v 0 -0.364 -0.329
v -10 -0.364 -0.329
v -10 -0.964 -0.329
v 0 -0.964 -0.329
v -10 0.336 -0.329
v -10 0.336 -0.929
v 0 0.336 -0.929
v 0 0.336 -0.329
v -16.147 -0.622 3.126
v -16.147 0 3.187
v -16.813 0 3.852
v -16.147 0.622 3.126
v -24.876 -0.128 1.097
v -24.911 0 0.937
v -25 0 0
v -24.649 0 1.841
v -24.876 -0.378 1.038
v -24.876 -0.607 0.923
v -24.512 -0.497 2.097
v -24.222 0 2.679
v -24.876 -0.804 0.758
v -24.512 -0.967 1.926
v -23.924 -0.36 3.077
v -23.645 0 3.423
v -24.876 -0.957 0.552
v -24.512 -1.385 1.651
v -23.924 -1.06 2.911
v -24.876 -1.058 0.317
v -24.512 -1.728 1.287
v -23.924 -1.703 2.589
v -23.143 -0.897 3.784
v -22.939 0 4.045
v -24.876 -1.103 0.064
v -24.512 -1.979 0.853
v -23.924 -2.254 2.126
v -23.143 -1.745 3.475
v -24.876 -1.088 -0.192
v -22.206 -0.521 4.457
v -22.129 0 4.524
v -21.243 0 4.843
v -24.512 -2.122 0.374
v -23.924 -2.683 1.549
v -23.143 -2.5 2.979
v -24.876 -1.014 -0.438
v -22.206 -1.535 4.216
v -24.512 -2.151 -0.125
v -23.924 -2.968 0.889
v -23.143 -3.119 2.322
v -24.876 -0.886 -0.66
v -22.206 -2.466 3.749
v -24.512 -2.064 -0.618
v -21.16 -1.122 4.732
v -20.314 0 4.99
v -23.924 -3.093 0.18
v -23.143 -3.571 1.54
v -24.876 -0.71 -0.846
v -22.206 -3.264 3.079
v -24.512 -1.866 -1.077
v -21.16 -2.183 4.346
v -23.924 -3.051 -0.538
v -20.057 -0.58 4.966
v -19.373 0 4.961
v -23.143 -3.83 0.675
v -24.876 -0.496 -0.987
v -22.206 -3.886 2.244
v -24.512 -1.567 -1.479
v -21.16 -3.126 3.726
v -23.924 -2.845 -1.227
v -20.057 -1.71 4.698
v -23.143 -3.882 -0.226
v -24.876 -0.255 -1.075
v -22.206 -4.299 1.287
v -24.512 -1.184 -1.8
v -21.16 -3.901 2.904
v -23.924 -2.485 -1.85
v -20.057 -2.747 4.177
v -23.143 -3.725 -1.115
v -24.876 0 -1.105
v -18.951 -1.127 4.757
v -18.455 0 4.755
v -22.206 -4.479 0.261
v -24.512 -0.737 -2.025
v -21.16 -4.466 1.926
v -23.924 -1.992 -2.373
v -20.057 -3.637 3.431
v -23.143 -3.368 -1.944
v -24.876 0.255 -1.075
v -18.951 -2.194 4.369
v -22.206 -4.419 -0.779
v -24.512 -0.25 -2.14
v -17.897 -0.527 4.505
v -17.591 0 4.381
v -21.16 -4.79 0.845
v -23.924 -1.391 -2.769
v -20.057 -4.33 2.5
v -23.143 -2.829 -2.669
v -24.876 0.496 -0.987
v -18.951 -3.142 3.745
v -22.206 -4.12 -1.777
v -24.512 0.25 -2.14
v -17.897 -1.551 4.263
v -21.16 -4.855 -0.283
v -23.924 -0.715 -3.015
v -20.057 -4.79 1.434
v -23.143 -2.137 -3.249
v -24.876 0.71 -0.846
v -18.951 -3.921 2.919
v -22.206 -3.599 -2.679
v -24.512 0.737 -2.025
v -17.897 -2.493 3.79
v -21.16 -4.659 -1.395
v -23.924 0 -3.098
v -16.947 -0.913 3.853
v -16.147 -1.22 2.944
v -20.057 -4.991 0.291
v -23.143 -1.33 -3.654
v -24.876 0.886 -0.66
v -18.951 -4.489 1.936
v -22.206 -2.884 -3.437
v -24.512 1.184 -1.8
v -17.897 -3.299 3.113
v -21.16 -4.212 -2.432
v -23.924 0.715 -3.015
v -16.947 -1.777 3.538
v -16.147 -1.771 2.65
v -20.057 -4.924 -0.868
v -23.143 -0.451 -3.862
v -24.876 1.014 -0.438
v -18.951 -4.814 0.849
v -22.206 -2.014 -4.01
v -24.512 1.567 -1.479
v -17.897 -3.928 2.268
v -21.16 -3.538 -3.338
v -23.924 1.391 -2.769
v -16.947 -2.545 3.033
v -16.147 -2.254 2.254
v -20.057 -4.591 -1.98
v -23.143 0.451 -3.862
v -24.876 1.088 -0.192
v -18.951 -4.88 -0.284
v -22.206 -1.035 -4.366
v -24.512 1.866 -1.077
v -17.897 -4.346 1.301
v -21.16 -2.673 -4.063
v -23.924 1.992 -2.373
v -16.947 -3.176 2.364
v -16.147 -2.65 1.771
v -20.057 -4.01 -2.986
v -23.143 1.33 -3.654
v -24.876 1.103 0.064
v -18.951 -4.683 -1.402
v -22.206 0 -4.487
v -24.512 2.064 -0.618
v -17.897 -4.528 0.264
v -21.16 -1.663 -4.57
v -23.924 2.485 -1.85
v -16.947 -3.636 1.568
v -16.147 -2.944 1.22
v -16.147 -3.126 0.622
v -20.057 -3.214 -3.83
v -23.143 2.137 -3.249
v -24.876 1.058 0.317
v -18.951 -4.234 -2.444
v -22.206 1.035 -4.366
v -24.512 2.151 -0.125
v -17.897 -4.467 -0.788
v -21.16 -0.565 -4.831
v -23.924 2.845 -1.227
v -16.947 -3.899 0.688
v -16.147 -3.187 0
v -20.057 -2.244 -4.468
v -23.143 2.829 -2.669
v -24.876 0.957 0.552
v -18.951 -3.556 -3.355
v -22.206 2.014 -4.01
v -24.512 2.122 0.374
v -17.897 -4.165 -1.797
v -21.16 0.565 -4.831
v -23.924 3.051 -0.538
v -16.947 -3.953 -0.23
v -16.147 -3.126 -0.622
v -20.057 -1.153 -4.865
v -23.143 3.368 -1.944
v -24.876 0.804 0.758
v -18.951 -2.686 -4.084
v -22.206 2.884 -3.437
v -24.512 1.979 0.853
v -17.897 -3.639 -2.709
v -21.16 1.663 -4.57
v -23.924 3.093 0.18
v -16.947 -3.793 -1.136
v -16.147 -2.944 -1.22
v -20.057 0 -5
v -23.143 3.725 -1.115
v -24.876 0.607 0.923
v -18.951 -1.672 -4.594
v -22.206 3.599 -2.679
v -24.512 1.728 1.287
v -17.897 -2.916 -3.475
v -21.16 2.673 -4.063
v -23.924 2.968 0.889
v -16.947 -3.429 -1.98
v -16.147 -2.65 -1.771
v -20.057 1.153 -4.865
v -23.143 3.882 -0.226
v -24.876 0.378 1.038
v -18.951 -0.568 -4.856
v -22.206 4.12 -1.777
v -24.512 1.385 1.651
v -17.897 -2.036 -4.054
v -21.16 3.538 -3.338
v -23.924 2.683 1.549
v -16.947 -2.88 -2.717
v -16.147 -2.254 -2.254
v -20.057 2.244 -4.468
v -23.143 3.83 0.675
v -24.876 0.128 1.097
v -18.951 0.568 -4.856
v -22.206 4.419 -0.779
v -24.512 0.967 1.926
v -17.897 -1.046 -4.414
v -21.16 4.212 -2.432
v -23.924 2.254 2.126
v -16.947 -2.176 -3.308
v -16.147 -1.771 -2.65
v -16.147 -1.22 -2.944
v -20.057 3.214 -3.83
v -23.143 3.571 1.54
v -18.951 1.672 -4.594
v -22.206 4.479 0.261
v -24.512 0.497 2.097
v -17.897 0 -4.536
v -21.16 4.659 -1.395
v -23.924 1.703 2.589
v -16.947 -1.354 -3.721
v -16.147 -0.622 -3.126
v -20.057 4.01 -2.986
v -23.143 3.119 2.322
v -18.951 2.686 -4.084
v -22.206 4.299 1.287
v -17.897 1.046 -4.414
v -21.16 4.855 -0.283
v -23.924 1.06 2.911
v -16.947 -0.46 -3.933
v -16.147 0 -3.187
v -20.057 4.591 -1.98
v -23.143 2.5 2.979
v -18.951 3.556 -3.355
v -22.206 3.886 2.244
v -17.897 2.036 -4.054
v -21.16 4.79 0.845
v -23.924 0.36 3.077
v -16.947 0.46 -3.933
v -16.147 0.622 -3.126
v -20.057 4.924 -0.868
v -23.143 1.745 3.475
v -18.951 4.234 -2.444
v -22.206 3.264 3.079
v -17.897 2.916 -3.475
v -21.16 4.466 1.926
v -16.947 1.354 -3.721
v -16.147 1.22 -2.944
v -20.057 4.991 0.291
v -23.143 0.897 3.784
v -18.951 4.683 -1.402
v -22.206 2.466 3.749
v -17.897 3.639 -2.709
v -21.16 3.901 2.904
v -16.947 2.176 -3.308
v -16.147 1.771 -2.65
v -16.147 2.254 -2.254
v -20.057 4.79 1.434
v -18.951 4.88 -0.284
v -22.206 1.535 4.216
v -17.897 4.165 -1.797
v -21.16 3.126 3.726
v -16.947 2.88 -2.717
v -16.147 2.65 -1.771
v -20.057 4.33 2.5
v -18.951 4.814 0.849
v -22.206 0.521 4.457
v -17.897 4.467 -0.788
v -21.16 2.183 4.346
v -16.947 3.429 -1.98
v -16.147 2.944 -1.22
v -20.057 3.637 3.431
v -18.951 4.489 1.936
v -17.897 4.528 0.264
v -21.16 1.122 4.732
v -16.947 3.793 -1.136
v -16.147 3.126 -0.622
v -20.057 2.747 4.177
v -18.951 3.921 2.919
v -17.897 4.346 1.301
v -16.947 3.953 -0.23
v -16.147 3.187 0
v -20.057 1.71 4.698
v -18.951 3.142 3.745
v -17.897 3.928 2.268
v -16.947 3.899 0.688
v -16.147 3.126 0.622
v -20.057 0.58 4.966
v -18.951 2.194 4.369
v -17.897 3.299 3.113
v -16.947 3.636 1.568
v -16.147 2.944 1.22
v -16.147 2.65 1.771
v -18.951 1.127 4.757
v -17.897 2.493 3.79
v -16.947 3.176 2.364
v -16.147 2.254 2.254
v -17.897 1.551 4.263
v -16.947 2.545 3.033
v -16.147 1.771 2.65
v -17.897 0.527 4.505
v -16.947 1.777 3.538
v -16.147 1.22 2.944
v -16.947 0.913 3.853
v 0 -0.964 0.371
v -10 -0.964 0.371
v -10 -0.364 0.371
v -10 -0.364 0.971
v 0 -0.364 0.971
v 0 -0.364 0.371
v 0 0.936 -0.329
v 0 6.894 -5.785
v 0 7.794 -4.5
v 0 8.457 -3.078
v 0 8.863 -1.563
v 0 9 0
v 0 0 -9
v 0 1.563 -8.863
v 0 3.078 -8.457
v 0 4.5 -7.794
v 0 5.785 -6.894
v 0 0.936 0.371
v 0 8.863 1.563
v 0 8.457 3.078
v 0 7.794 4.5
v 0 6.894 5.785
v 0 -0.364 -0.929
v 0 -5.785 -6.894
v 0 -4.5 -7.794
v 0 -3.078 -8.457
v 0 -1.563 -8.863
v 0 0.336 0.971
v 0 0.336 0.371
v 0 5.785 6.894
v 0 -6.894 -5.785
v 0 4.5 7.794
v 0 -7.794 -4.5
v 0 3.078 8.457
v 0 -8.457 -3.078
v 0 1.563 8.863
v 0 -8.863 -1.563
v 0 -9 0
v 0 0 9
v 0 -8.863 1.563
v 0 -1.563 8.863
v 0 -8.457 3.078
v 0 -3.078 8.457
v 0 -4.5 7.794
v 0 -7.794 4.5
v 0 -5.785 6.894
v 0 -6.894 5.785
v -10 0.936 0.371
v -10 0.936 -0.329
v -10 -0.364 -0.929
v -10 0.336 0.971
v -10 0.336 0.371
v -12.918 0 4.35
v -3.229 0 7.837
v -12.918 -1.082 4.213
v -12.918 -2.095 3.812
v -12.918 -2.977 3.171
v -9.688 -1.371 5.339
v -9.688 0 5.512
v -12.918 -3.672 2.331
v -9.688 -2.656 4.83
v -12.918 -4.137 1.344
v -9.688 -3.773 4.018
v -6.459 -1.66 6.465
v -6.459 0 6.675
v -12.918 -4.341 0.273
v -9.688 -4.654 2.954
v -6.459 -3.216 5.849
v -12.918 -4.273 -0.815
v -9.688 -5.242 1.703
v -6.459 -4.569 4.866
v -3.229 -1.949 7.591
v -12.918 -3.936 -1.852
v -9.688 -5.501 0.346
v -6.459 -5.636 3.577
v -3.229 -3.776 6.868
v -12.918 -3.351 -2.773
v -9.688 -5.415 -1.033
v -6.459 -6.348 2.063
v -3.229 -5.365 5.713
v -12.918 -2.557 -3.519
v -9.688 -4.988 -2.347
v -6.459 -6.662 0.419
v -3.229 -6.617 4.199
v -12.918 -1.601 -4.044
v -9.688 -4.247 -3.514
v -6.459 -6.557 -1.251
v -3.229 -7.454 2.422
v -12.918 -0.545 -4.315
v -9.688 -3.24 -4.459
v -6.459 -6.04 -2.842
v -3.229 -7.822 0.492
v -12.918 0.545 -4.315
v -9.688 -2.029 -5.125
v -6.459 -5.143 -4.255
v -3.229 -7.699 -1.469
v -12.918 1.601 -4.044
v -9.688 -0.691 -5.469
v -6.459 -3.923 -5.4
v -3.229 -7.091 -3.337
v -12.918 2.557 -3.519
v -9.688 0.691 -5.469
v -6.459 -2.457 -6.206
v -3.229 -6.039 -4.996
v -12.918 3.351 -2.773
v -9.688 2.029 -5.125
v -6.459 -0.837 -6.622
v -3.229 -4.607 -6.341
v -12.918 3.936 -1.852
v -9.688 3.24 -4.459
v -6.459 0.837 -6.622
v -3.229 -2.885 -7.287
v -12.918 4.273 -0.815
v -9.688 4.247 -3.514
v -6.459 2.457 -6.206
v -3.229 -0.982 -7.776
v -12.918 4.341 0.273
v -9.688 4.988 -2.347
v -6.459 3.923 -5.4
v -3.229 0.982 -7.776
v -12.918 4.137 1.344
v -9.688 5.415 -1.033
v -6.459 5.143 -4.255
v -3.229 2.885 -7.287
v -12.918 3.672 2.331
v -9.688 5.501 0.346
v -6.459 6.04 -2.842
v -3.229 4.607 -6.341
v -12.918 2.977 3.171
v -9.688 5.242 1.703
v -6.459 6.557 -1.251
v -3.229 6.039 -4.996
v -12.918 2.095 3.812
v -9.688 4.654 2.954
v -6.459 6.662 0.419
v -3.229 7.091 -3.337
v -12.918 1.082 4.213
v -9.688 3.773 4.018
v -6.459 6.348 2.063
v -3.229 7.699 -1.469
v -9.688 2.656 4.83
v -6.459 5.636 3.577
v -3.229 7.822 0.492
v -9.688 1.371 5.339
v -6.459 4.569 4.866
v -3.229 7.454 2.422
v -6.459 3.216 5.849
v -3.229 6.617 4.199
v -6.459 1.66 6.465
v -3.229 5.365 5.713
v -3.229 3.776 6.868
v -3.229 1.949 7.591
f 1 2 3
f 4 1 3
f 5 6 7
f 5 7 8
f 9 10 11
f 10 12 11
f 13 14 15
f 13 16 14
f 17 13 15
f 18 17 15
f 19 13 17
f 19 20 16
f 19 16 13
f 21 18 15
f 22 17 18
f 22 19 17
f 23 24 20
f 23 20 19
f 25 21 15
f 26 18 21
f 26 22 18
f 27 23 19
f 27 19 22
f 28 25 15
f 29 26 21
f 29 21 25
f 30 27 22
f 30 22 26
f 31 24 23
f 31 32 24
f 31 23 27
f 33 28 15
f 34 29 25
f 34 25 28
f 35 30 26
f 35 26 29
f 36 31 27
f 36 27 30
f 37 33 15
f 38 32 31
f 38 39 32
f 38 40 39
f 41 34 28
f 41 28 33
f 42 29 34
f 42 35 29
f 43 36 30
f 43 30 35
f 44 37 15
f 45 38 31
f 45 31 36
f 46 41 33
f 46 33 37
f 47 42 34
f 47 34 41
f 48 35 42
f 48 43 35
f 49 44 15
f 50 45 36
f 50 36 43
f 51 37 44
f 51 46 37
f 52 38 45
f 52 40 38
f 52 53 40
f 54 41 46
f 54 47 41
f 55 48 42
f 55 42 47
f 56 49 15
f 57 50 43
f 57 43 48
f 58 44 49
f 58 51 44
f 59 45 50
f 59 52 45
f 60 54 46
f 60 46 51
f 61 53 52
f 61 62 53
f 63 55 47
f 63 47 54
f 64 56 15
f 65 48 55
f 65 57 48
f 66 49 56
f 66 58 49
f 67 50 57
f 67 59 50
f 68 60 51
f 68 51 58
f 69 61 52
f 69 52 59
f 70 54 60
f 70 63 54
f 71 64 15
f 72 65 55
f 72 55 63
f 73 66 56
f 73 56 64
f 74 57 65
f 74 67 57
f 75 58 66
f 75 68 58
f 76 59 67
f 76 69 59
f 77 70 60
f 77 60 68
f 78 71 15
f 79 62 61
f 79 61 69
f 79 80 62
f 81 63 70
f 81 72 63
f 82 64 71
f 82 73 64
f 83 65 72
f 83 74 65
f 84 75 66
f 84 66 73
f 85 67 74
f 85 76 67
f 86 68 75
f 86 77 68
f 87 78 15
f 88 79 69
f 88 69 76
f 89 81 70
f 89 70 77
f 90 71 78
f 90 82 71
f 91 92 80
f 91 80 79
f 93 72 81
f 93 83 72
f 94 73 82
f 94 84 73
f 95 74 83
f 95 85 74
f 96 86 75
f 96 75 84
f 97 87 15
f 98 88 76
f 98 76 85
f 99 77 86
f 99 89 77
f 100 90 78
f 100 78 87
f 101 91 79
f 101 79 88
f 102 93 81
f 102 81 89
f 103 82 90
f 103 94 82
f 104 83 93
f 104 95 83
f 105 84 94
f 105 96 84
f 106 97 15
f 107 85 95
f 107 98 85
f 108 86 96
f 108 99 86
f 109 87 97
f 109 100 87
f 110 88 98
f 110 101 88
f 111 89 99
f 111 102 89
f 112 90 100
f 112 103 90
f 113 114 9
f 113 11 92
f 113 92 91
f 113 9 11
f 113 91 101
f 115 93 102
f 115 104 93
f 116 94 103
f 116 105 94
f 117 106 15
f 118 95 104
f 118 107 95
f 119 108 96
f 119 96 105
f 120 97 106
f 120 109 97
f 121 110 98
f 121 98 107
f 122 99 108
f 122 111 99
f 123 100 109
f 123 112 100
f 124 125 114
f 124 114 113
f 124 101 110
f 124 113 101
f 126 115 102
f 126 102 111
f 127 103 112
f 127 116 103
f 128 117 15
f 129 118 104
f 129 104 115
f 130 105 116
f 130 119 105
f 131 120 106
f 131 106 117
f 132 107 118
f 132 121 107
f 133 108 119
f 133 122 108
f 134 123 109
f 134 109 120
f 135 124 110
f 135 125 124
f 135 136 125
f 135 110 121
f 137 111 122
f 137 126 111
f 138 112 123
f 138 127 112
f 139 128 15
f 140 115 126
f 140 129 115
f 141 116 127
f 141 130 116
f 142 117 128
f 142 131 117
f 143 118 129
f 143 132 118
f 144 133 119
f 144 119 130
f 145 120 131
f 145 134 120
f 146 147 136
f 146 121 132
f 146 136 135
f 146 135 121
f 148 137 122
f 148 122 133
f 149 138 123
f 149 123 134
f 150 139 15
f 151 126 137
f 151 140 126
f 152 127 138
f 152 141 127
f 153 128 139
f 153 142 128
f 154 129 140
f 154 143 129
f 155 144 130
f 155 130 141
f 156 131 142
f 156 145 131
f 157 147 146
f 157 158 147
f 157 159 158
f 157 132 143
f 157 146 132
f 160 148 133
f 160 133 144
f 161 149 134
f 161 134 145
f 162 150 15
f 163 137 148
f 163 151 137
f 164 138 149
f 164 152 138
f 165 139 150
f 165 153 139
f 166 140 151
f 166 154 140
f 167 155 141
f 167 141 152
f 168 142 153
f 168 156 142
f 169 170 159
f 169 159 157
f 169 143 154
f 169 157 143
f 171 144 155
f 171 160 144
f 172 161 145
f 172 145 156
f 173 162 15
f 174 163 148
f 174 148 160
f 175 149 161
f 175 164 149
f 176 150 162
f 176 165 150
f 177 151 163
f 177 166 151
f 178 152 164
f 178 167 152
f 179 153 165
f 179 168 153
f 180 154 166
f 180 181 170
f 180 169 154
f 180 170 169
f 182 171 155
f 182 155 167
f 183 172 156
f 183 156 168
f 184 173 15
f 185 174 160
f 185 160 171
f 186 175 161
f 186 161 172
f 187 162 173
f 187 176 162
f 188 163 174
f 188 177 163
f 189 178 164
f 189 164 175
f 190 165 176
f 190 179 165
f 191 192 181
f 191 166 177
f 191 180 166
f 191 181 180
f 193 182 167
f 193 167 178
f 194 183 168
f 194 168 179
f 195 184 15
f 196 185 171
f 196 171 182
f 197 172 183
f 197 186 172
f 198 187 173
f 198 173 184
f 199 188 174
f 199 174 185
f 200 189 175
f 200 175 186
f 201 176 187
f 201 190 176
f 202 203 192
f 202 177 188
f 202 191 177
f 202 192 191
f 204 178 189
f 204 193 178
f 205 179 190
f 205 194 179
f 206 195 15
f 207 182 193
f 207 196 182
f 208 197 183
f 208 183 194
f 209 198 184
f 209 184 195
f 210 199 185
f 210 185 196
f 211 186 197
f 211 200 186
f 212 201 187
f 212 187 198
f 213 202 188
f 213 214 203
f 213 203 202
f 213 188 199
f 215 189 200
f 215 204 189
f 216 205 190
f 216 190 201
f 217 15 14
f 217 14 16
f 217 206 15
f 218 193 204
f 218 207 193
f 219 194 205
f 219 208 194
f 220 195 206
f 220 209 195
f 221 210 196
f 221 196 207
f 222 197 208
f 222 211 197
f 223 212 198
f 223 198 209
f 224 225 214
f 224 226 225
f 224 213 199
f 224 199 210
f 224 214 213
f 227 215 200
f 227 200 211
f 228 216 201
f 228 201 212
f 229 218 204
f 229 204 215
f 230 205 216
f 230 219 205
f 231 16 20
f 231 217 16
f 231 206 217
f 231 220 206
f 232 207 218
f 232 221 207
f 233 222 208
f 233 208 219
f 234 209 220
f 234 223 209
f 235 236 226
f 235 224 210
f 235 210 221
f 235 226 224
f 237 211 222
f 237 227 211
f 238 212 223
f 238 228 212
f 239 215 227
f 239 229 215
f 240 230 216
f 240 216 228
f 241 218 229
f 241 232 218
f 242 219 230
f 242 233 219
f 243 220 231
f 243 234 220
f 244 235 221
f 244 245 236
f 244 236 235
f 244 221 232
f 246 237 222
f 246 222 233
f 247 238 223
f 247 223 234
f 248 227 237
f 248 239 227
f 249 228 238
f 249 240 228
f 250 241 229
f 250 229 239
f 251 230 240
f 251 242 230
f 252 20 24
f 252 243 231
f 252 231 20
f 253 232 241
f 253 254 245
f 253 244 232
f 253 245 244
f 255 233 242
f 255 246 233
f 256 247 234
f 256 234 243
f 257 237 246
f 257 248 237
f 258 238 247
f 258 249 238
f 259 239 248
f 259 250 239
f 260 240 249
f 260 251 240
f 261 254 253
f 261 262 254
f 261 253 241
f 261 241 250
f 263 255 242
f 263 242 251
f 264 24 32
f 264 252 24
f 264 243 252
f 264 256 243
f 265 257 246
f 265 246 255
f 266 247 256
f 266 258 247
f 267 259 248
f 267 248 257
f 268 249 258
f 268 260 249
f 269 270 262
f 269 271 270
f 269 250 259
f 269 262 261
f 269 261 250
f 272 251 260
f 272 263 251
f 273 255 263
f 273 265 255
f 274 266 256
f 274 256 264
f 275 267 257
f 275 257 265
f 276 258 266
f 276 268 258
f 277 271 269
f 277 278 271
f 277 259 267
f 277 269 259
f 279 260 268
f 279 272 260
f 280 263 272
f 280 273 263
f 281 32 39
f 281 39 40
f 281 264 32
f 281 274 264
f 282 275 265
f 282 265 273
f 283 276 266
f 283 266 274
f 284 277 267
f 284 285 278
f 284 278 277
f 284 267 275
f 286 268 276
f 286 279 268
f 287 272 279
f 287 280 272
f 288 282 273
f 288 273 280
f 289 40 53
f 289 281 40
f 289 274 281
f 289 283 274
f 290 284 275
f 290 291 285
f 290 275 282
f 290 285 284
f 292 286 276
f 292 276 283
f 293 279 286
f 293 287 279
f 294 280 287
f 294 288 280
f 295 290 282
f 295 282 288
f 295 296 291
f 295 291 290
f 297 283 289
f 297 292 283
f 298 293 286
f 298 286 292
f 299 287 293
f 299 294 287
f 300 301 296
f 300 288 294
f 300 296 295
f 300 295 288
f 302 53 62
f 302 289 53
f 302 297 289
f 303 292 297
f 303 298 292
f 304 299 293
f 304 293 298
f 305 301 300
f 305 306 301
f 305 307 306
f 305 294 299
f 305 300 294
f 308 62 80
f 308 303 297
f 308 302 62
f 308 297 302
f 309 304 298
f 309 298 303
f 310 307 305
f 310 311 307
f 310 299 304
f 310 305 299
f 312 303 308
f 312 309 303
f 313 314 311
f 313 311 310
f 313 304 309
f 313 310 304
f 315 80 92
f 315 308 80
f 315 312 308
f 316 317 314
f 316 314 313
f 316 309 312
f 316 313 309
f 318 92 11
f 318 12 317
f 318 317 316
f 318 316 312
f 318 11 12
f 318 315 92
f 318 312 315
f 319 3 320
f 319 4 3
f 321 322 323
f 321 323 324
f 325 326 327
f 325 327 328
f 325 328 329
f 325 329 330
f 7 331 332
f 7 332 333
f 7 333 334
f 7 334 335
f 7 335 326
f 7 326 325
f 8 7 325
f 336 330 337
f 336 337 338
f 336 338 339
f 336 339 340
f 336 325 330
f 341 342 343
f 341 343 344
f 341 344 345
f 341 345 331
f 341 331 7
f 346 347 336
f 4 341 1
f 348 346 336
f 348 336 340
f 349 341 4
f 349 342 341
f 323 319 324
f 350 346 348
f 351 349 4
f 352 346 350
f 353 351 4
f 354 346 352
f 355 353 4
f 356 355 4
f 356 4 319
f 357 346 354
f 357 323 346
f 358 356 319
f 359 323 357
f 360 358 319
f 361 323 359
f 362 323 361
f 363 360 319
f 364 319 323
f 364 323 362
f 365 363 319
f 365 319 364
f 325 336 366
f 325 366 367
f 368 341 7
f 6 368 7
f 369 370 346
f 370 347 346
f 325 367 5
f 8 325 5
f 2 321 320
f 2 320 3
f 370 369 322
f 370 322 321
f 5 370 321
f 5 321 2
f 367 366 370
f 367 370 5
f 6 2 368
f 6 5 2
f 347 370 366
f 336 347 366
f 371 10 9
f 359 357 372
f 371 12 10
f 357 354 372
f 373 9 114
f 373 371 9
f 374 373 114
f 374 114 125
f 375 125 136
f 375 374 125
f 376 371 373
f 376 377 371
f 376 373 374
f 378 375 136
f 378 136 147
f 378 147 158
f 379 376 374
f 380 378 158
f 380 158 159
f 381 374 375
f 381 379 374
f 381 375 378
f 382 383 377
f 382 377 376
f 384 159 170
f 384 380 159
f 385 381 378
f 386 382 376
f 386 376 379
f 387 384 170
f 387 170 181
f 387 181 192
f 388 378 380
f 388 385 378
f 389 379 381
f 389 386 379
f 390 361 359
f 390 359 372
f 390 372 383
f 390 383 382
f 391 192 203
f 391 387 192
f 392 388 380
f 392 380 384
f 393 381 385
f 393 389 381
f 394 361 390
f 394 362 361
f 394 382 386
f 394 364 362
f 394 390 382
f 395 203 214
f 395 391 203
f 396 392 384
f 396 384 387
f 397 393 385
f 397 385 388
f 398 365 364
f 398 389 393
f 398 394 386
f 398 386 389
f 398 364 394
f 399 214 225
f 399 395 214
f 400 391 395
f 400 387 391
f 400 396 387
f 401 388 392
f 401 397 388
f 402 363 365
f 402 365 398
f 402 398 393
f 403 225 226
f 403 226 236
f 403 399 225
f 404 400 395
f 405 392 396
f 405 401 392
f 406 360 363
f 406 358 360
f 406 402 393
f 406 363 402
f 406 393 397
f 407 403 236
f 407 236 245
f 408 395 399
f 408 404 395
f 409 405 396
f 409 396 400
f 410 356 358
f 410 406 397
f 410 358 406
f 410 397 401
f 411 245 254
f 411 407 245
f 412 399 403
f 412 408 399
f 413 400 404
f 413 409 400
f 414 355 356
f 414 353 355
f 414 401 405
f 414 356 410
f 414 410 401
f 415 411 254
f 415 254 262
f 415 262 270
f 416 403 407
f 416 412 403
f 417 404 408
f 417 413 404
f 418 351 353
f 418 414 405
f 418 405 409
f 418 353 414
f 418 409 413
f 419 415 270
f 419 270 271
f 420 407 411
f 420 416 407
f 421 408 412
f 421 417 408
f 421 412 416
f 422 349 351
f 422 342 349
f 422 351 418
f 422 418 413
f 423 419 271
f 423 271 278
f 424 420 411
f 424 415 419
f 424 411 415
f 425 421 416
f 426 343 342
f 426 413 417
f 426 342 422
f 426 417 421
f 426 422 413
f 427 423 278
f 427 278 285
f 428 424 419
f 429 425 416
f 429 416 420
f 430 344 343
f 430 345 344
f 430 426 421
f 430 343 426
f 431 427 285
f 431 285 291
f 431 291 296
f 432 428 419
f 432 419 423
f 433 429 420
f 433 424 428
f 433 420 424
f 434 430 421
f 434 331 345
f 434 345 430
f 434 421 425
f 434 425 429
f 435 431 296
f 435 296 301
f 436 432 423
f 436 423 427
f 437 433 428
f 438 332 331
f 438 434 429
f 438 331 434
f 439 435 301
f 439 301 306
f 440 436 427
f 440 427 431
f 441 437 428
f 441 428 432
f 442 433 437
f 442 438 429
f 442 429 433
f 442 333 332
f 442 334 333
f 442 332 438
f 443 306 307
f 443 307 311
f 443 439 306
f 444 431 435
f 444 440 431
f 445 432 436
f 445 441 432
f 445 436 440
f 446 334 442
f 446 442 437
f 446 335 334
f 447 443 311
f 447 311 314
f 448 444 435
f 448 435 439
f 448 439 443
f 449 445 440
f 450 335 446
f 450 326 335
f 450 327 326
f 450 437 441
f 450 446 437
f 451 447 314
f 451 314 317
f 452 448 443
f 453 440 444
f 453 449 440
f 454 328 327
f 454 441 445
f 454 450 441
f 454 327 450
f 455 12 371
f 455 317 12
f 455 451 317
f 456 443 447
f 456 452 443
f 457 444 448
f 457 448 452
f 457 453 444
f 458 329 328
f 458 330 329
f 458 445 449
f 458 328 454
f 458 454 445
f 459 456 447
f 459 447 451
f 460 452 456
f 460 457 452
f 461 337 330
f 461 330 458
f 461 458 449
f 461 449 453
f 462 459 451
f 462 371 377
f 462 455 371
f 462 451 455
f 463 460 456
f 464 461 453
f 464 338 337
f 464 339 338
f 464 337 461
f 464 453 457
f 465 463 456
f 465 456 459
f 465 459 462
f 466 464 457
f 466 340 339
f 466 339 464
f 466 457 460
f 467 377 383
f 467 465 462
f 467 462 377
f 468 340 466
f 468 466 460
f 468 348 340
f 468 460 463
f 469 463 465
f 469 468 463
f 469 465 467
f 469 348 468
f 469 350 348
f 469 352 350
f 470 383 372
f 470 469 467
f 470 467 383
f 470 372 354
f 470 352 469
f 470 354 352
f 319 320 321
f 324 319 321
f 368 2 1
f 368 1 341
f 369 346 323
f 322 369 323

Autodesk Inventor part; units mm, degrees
ref_plane "YZ Plane" through (0, 0, 0) normal (1, 0, 0) x (0, 1, 0)
ref_plane "XZ Plane" through (0, 0, 0) normal (0, 1, 0) x (-1, 0, 0)
ref_plane "XY Plane" through (0, 0, 0) normal (0, 0, 1) x (1, 0, 0)
sketch "Esquisse1" plane through (0, 0, 0) normal (0, 1, 0) x (-1, 0, 0)
  line L0 (0, 0) -> (25, 0)
  line L1 (25, 0) -> (0, 0)
  line L2 (0, 0) -> (0, 9)
  line L3 (0, 9) -> (25, 0)
  arc A0 (25, 0) -> (15, 0) centre (20, 0) ccw
  dimension "d0" = 9
  dimension "d1" = 25
  dimension "d2" = 5
revolve "Révolution1" add sketch "Esquisse1" angle 360 about axis through (-25, 0, 0) along (1, 0, 0)
sketch "Esquisse2" plane through (0, 0, 0) normal (1, 0, 0) x (0, 0, -1)
  line L0 (-0.3714, 0.9357) -> (0.3286, 0.9357)
  line L1 (0.3286, 0.9357) -> (0.3286, -0.9643)
  line L2 (0.3286, -0.9643) -> (-0.3714, -0.9643)
  line L3 (-0.3714, -0.9643) -> (-0.3714, 0.9357)
  line L4 (0.9286, 0.3357) -> (-0.9714, 0.3357)
  line L5 (-0.9714, 0.3357) -> (-0.9714, -0.3643)
  line L6 (-0.9714, -0.3643) -> (0.9286, -0.3643)
  line L7 (0.9286, -0.3643) -> (0.9286, 0.3357)
  point P0 (0, 0)
  dimension "d4" = 0.7
  dimension "d5" = 0.7
  dimension "d6" = 1.9
  dimension "d7" = 1.9
  dimension "d8" = 0.6
  dimension "d9" = 0.6
extrude "Extrusion1" cut sketch "Esquisse2" against normal blind 10
properties part number "pion" material "Verre"
